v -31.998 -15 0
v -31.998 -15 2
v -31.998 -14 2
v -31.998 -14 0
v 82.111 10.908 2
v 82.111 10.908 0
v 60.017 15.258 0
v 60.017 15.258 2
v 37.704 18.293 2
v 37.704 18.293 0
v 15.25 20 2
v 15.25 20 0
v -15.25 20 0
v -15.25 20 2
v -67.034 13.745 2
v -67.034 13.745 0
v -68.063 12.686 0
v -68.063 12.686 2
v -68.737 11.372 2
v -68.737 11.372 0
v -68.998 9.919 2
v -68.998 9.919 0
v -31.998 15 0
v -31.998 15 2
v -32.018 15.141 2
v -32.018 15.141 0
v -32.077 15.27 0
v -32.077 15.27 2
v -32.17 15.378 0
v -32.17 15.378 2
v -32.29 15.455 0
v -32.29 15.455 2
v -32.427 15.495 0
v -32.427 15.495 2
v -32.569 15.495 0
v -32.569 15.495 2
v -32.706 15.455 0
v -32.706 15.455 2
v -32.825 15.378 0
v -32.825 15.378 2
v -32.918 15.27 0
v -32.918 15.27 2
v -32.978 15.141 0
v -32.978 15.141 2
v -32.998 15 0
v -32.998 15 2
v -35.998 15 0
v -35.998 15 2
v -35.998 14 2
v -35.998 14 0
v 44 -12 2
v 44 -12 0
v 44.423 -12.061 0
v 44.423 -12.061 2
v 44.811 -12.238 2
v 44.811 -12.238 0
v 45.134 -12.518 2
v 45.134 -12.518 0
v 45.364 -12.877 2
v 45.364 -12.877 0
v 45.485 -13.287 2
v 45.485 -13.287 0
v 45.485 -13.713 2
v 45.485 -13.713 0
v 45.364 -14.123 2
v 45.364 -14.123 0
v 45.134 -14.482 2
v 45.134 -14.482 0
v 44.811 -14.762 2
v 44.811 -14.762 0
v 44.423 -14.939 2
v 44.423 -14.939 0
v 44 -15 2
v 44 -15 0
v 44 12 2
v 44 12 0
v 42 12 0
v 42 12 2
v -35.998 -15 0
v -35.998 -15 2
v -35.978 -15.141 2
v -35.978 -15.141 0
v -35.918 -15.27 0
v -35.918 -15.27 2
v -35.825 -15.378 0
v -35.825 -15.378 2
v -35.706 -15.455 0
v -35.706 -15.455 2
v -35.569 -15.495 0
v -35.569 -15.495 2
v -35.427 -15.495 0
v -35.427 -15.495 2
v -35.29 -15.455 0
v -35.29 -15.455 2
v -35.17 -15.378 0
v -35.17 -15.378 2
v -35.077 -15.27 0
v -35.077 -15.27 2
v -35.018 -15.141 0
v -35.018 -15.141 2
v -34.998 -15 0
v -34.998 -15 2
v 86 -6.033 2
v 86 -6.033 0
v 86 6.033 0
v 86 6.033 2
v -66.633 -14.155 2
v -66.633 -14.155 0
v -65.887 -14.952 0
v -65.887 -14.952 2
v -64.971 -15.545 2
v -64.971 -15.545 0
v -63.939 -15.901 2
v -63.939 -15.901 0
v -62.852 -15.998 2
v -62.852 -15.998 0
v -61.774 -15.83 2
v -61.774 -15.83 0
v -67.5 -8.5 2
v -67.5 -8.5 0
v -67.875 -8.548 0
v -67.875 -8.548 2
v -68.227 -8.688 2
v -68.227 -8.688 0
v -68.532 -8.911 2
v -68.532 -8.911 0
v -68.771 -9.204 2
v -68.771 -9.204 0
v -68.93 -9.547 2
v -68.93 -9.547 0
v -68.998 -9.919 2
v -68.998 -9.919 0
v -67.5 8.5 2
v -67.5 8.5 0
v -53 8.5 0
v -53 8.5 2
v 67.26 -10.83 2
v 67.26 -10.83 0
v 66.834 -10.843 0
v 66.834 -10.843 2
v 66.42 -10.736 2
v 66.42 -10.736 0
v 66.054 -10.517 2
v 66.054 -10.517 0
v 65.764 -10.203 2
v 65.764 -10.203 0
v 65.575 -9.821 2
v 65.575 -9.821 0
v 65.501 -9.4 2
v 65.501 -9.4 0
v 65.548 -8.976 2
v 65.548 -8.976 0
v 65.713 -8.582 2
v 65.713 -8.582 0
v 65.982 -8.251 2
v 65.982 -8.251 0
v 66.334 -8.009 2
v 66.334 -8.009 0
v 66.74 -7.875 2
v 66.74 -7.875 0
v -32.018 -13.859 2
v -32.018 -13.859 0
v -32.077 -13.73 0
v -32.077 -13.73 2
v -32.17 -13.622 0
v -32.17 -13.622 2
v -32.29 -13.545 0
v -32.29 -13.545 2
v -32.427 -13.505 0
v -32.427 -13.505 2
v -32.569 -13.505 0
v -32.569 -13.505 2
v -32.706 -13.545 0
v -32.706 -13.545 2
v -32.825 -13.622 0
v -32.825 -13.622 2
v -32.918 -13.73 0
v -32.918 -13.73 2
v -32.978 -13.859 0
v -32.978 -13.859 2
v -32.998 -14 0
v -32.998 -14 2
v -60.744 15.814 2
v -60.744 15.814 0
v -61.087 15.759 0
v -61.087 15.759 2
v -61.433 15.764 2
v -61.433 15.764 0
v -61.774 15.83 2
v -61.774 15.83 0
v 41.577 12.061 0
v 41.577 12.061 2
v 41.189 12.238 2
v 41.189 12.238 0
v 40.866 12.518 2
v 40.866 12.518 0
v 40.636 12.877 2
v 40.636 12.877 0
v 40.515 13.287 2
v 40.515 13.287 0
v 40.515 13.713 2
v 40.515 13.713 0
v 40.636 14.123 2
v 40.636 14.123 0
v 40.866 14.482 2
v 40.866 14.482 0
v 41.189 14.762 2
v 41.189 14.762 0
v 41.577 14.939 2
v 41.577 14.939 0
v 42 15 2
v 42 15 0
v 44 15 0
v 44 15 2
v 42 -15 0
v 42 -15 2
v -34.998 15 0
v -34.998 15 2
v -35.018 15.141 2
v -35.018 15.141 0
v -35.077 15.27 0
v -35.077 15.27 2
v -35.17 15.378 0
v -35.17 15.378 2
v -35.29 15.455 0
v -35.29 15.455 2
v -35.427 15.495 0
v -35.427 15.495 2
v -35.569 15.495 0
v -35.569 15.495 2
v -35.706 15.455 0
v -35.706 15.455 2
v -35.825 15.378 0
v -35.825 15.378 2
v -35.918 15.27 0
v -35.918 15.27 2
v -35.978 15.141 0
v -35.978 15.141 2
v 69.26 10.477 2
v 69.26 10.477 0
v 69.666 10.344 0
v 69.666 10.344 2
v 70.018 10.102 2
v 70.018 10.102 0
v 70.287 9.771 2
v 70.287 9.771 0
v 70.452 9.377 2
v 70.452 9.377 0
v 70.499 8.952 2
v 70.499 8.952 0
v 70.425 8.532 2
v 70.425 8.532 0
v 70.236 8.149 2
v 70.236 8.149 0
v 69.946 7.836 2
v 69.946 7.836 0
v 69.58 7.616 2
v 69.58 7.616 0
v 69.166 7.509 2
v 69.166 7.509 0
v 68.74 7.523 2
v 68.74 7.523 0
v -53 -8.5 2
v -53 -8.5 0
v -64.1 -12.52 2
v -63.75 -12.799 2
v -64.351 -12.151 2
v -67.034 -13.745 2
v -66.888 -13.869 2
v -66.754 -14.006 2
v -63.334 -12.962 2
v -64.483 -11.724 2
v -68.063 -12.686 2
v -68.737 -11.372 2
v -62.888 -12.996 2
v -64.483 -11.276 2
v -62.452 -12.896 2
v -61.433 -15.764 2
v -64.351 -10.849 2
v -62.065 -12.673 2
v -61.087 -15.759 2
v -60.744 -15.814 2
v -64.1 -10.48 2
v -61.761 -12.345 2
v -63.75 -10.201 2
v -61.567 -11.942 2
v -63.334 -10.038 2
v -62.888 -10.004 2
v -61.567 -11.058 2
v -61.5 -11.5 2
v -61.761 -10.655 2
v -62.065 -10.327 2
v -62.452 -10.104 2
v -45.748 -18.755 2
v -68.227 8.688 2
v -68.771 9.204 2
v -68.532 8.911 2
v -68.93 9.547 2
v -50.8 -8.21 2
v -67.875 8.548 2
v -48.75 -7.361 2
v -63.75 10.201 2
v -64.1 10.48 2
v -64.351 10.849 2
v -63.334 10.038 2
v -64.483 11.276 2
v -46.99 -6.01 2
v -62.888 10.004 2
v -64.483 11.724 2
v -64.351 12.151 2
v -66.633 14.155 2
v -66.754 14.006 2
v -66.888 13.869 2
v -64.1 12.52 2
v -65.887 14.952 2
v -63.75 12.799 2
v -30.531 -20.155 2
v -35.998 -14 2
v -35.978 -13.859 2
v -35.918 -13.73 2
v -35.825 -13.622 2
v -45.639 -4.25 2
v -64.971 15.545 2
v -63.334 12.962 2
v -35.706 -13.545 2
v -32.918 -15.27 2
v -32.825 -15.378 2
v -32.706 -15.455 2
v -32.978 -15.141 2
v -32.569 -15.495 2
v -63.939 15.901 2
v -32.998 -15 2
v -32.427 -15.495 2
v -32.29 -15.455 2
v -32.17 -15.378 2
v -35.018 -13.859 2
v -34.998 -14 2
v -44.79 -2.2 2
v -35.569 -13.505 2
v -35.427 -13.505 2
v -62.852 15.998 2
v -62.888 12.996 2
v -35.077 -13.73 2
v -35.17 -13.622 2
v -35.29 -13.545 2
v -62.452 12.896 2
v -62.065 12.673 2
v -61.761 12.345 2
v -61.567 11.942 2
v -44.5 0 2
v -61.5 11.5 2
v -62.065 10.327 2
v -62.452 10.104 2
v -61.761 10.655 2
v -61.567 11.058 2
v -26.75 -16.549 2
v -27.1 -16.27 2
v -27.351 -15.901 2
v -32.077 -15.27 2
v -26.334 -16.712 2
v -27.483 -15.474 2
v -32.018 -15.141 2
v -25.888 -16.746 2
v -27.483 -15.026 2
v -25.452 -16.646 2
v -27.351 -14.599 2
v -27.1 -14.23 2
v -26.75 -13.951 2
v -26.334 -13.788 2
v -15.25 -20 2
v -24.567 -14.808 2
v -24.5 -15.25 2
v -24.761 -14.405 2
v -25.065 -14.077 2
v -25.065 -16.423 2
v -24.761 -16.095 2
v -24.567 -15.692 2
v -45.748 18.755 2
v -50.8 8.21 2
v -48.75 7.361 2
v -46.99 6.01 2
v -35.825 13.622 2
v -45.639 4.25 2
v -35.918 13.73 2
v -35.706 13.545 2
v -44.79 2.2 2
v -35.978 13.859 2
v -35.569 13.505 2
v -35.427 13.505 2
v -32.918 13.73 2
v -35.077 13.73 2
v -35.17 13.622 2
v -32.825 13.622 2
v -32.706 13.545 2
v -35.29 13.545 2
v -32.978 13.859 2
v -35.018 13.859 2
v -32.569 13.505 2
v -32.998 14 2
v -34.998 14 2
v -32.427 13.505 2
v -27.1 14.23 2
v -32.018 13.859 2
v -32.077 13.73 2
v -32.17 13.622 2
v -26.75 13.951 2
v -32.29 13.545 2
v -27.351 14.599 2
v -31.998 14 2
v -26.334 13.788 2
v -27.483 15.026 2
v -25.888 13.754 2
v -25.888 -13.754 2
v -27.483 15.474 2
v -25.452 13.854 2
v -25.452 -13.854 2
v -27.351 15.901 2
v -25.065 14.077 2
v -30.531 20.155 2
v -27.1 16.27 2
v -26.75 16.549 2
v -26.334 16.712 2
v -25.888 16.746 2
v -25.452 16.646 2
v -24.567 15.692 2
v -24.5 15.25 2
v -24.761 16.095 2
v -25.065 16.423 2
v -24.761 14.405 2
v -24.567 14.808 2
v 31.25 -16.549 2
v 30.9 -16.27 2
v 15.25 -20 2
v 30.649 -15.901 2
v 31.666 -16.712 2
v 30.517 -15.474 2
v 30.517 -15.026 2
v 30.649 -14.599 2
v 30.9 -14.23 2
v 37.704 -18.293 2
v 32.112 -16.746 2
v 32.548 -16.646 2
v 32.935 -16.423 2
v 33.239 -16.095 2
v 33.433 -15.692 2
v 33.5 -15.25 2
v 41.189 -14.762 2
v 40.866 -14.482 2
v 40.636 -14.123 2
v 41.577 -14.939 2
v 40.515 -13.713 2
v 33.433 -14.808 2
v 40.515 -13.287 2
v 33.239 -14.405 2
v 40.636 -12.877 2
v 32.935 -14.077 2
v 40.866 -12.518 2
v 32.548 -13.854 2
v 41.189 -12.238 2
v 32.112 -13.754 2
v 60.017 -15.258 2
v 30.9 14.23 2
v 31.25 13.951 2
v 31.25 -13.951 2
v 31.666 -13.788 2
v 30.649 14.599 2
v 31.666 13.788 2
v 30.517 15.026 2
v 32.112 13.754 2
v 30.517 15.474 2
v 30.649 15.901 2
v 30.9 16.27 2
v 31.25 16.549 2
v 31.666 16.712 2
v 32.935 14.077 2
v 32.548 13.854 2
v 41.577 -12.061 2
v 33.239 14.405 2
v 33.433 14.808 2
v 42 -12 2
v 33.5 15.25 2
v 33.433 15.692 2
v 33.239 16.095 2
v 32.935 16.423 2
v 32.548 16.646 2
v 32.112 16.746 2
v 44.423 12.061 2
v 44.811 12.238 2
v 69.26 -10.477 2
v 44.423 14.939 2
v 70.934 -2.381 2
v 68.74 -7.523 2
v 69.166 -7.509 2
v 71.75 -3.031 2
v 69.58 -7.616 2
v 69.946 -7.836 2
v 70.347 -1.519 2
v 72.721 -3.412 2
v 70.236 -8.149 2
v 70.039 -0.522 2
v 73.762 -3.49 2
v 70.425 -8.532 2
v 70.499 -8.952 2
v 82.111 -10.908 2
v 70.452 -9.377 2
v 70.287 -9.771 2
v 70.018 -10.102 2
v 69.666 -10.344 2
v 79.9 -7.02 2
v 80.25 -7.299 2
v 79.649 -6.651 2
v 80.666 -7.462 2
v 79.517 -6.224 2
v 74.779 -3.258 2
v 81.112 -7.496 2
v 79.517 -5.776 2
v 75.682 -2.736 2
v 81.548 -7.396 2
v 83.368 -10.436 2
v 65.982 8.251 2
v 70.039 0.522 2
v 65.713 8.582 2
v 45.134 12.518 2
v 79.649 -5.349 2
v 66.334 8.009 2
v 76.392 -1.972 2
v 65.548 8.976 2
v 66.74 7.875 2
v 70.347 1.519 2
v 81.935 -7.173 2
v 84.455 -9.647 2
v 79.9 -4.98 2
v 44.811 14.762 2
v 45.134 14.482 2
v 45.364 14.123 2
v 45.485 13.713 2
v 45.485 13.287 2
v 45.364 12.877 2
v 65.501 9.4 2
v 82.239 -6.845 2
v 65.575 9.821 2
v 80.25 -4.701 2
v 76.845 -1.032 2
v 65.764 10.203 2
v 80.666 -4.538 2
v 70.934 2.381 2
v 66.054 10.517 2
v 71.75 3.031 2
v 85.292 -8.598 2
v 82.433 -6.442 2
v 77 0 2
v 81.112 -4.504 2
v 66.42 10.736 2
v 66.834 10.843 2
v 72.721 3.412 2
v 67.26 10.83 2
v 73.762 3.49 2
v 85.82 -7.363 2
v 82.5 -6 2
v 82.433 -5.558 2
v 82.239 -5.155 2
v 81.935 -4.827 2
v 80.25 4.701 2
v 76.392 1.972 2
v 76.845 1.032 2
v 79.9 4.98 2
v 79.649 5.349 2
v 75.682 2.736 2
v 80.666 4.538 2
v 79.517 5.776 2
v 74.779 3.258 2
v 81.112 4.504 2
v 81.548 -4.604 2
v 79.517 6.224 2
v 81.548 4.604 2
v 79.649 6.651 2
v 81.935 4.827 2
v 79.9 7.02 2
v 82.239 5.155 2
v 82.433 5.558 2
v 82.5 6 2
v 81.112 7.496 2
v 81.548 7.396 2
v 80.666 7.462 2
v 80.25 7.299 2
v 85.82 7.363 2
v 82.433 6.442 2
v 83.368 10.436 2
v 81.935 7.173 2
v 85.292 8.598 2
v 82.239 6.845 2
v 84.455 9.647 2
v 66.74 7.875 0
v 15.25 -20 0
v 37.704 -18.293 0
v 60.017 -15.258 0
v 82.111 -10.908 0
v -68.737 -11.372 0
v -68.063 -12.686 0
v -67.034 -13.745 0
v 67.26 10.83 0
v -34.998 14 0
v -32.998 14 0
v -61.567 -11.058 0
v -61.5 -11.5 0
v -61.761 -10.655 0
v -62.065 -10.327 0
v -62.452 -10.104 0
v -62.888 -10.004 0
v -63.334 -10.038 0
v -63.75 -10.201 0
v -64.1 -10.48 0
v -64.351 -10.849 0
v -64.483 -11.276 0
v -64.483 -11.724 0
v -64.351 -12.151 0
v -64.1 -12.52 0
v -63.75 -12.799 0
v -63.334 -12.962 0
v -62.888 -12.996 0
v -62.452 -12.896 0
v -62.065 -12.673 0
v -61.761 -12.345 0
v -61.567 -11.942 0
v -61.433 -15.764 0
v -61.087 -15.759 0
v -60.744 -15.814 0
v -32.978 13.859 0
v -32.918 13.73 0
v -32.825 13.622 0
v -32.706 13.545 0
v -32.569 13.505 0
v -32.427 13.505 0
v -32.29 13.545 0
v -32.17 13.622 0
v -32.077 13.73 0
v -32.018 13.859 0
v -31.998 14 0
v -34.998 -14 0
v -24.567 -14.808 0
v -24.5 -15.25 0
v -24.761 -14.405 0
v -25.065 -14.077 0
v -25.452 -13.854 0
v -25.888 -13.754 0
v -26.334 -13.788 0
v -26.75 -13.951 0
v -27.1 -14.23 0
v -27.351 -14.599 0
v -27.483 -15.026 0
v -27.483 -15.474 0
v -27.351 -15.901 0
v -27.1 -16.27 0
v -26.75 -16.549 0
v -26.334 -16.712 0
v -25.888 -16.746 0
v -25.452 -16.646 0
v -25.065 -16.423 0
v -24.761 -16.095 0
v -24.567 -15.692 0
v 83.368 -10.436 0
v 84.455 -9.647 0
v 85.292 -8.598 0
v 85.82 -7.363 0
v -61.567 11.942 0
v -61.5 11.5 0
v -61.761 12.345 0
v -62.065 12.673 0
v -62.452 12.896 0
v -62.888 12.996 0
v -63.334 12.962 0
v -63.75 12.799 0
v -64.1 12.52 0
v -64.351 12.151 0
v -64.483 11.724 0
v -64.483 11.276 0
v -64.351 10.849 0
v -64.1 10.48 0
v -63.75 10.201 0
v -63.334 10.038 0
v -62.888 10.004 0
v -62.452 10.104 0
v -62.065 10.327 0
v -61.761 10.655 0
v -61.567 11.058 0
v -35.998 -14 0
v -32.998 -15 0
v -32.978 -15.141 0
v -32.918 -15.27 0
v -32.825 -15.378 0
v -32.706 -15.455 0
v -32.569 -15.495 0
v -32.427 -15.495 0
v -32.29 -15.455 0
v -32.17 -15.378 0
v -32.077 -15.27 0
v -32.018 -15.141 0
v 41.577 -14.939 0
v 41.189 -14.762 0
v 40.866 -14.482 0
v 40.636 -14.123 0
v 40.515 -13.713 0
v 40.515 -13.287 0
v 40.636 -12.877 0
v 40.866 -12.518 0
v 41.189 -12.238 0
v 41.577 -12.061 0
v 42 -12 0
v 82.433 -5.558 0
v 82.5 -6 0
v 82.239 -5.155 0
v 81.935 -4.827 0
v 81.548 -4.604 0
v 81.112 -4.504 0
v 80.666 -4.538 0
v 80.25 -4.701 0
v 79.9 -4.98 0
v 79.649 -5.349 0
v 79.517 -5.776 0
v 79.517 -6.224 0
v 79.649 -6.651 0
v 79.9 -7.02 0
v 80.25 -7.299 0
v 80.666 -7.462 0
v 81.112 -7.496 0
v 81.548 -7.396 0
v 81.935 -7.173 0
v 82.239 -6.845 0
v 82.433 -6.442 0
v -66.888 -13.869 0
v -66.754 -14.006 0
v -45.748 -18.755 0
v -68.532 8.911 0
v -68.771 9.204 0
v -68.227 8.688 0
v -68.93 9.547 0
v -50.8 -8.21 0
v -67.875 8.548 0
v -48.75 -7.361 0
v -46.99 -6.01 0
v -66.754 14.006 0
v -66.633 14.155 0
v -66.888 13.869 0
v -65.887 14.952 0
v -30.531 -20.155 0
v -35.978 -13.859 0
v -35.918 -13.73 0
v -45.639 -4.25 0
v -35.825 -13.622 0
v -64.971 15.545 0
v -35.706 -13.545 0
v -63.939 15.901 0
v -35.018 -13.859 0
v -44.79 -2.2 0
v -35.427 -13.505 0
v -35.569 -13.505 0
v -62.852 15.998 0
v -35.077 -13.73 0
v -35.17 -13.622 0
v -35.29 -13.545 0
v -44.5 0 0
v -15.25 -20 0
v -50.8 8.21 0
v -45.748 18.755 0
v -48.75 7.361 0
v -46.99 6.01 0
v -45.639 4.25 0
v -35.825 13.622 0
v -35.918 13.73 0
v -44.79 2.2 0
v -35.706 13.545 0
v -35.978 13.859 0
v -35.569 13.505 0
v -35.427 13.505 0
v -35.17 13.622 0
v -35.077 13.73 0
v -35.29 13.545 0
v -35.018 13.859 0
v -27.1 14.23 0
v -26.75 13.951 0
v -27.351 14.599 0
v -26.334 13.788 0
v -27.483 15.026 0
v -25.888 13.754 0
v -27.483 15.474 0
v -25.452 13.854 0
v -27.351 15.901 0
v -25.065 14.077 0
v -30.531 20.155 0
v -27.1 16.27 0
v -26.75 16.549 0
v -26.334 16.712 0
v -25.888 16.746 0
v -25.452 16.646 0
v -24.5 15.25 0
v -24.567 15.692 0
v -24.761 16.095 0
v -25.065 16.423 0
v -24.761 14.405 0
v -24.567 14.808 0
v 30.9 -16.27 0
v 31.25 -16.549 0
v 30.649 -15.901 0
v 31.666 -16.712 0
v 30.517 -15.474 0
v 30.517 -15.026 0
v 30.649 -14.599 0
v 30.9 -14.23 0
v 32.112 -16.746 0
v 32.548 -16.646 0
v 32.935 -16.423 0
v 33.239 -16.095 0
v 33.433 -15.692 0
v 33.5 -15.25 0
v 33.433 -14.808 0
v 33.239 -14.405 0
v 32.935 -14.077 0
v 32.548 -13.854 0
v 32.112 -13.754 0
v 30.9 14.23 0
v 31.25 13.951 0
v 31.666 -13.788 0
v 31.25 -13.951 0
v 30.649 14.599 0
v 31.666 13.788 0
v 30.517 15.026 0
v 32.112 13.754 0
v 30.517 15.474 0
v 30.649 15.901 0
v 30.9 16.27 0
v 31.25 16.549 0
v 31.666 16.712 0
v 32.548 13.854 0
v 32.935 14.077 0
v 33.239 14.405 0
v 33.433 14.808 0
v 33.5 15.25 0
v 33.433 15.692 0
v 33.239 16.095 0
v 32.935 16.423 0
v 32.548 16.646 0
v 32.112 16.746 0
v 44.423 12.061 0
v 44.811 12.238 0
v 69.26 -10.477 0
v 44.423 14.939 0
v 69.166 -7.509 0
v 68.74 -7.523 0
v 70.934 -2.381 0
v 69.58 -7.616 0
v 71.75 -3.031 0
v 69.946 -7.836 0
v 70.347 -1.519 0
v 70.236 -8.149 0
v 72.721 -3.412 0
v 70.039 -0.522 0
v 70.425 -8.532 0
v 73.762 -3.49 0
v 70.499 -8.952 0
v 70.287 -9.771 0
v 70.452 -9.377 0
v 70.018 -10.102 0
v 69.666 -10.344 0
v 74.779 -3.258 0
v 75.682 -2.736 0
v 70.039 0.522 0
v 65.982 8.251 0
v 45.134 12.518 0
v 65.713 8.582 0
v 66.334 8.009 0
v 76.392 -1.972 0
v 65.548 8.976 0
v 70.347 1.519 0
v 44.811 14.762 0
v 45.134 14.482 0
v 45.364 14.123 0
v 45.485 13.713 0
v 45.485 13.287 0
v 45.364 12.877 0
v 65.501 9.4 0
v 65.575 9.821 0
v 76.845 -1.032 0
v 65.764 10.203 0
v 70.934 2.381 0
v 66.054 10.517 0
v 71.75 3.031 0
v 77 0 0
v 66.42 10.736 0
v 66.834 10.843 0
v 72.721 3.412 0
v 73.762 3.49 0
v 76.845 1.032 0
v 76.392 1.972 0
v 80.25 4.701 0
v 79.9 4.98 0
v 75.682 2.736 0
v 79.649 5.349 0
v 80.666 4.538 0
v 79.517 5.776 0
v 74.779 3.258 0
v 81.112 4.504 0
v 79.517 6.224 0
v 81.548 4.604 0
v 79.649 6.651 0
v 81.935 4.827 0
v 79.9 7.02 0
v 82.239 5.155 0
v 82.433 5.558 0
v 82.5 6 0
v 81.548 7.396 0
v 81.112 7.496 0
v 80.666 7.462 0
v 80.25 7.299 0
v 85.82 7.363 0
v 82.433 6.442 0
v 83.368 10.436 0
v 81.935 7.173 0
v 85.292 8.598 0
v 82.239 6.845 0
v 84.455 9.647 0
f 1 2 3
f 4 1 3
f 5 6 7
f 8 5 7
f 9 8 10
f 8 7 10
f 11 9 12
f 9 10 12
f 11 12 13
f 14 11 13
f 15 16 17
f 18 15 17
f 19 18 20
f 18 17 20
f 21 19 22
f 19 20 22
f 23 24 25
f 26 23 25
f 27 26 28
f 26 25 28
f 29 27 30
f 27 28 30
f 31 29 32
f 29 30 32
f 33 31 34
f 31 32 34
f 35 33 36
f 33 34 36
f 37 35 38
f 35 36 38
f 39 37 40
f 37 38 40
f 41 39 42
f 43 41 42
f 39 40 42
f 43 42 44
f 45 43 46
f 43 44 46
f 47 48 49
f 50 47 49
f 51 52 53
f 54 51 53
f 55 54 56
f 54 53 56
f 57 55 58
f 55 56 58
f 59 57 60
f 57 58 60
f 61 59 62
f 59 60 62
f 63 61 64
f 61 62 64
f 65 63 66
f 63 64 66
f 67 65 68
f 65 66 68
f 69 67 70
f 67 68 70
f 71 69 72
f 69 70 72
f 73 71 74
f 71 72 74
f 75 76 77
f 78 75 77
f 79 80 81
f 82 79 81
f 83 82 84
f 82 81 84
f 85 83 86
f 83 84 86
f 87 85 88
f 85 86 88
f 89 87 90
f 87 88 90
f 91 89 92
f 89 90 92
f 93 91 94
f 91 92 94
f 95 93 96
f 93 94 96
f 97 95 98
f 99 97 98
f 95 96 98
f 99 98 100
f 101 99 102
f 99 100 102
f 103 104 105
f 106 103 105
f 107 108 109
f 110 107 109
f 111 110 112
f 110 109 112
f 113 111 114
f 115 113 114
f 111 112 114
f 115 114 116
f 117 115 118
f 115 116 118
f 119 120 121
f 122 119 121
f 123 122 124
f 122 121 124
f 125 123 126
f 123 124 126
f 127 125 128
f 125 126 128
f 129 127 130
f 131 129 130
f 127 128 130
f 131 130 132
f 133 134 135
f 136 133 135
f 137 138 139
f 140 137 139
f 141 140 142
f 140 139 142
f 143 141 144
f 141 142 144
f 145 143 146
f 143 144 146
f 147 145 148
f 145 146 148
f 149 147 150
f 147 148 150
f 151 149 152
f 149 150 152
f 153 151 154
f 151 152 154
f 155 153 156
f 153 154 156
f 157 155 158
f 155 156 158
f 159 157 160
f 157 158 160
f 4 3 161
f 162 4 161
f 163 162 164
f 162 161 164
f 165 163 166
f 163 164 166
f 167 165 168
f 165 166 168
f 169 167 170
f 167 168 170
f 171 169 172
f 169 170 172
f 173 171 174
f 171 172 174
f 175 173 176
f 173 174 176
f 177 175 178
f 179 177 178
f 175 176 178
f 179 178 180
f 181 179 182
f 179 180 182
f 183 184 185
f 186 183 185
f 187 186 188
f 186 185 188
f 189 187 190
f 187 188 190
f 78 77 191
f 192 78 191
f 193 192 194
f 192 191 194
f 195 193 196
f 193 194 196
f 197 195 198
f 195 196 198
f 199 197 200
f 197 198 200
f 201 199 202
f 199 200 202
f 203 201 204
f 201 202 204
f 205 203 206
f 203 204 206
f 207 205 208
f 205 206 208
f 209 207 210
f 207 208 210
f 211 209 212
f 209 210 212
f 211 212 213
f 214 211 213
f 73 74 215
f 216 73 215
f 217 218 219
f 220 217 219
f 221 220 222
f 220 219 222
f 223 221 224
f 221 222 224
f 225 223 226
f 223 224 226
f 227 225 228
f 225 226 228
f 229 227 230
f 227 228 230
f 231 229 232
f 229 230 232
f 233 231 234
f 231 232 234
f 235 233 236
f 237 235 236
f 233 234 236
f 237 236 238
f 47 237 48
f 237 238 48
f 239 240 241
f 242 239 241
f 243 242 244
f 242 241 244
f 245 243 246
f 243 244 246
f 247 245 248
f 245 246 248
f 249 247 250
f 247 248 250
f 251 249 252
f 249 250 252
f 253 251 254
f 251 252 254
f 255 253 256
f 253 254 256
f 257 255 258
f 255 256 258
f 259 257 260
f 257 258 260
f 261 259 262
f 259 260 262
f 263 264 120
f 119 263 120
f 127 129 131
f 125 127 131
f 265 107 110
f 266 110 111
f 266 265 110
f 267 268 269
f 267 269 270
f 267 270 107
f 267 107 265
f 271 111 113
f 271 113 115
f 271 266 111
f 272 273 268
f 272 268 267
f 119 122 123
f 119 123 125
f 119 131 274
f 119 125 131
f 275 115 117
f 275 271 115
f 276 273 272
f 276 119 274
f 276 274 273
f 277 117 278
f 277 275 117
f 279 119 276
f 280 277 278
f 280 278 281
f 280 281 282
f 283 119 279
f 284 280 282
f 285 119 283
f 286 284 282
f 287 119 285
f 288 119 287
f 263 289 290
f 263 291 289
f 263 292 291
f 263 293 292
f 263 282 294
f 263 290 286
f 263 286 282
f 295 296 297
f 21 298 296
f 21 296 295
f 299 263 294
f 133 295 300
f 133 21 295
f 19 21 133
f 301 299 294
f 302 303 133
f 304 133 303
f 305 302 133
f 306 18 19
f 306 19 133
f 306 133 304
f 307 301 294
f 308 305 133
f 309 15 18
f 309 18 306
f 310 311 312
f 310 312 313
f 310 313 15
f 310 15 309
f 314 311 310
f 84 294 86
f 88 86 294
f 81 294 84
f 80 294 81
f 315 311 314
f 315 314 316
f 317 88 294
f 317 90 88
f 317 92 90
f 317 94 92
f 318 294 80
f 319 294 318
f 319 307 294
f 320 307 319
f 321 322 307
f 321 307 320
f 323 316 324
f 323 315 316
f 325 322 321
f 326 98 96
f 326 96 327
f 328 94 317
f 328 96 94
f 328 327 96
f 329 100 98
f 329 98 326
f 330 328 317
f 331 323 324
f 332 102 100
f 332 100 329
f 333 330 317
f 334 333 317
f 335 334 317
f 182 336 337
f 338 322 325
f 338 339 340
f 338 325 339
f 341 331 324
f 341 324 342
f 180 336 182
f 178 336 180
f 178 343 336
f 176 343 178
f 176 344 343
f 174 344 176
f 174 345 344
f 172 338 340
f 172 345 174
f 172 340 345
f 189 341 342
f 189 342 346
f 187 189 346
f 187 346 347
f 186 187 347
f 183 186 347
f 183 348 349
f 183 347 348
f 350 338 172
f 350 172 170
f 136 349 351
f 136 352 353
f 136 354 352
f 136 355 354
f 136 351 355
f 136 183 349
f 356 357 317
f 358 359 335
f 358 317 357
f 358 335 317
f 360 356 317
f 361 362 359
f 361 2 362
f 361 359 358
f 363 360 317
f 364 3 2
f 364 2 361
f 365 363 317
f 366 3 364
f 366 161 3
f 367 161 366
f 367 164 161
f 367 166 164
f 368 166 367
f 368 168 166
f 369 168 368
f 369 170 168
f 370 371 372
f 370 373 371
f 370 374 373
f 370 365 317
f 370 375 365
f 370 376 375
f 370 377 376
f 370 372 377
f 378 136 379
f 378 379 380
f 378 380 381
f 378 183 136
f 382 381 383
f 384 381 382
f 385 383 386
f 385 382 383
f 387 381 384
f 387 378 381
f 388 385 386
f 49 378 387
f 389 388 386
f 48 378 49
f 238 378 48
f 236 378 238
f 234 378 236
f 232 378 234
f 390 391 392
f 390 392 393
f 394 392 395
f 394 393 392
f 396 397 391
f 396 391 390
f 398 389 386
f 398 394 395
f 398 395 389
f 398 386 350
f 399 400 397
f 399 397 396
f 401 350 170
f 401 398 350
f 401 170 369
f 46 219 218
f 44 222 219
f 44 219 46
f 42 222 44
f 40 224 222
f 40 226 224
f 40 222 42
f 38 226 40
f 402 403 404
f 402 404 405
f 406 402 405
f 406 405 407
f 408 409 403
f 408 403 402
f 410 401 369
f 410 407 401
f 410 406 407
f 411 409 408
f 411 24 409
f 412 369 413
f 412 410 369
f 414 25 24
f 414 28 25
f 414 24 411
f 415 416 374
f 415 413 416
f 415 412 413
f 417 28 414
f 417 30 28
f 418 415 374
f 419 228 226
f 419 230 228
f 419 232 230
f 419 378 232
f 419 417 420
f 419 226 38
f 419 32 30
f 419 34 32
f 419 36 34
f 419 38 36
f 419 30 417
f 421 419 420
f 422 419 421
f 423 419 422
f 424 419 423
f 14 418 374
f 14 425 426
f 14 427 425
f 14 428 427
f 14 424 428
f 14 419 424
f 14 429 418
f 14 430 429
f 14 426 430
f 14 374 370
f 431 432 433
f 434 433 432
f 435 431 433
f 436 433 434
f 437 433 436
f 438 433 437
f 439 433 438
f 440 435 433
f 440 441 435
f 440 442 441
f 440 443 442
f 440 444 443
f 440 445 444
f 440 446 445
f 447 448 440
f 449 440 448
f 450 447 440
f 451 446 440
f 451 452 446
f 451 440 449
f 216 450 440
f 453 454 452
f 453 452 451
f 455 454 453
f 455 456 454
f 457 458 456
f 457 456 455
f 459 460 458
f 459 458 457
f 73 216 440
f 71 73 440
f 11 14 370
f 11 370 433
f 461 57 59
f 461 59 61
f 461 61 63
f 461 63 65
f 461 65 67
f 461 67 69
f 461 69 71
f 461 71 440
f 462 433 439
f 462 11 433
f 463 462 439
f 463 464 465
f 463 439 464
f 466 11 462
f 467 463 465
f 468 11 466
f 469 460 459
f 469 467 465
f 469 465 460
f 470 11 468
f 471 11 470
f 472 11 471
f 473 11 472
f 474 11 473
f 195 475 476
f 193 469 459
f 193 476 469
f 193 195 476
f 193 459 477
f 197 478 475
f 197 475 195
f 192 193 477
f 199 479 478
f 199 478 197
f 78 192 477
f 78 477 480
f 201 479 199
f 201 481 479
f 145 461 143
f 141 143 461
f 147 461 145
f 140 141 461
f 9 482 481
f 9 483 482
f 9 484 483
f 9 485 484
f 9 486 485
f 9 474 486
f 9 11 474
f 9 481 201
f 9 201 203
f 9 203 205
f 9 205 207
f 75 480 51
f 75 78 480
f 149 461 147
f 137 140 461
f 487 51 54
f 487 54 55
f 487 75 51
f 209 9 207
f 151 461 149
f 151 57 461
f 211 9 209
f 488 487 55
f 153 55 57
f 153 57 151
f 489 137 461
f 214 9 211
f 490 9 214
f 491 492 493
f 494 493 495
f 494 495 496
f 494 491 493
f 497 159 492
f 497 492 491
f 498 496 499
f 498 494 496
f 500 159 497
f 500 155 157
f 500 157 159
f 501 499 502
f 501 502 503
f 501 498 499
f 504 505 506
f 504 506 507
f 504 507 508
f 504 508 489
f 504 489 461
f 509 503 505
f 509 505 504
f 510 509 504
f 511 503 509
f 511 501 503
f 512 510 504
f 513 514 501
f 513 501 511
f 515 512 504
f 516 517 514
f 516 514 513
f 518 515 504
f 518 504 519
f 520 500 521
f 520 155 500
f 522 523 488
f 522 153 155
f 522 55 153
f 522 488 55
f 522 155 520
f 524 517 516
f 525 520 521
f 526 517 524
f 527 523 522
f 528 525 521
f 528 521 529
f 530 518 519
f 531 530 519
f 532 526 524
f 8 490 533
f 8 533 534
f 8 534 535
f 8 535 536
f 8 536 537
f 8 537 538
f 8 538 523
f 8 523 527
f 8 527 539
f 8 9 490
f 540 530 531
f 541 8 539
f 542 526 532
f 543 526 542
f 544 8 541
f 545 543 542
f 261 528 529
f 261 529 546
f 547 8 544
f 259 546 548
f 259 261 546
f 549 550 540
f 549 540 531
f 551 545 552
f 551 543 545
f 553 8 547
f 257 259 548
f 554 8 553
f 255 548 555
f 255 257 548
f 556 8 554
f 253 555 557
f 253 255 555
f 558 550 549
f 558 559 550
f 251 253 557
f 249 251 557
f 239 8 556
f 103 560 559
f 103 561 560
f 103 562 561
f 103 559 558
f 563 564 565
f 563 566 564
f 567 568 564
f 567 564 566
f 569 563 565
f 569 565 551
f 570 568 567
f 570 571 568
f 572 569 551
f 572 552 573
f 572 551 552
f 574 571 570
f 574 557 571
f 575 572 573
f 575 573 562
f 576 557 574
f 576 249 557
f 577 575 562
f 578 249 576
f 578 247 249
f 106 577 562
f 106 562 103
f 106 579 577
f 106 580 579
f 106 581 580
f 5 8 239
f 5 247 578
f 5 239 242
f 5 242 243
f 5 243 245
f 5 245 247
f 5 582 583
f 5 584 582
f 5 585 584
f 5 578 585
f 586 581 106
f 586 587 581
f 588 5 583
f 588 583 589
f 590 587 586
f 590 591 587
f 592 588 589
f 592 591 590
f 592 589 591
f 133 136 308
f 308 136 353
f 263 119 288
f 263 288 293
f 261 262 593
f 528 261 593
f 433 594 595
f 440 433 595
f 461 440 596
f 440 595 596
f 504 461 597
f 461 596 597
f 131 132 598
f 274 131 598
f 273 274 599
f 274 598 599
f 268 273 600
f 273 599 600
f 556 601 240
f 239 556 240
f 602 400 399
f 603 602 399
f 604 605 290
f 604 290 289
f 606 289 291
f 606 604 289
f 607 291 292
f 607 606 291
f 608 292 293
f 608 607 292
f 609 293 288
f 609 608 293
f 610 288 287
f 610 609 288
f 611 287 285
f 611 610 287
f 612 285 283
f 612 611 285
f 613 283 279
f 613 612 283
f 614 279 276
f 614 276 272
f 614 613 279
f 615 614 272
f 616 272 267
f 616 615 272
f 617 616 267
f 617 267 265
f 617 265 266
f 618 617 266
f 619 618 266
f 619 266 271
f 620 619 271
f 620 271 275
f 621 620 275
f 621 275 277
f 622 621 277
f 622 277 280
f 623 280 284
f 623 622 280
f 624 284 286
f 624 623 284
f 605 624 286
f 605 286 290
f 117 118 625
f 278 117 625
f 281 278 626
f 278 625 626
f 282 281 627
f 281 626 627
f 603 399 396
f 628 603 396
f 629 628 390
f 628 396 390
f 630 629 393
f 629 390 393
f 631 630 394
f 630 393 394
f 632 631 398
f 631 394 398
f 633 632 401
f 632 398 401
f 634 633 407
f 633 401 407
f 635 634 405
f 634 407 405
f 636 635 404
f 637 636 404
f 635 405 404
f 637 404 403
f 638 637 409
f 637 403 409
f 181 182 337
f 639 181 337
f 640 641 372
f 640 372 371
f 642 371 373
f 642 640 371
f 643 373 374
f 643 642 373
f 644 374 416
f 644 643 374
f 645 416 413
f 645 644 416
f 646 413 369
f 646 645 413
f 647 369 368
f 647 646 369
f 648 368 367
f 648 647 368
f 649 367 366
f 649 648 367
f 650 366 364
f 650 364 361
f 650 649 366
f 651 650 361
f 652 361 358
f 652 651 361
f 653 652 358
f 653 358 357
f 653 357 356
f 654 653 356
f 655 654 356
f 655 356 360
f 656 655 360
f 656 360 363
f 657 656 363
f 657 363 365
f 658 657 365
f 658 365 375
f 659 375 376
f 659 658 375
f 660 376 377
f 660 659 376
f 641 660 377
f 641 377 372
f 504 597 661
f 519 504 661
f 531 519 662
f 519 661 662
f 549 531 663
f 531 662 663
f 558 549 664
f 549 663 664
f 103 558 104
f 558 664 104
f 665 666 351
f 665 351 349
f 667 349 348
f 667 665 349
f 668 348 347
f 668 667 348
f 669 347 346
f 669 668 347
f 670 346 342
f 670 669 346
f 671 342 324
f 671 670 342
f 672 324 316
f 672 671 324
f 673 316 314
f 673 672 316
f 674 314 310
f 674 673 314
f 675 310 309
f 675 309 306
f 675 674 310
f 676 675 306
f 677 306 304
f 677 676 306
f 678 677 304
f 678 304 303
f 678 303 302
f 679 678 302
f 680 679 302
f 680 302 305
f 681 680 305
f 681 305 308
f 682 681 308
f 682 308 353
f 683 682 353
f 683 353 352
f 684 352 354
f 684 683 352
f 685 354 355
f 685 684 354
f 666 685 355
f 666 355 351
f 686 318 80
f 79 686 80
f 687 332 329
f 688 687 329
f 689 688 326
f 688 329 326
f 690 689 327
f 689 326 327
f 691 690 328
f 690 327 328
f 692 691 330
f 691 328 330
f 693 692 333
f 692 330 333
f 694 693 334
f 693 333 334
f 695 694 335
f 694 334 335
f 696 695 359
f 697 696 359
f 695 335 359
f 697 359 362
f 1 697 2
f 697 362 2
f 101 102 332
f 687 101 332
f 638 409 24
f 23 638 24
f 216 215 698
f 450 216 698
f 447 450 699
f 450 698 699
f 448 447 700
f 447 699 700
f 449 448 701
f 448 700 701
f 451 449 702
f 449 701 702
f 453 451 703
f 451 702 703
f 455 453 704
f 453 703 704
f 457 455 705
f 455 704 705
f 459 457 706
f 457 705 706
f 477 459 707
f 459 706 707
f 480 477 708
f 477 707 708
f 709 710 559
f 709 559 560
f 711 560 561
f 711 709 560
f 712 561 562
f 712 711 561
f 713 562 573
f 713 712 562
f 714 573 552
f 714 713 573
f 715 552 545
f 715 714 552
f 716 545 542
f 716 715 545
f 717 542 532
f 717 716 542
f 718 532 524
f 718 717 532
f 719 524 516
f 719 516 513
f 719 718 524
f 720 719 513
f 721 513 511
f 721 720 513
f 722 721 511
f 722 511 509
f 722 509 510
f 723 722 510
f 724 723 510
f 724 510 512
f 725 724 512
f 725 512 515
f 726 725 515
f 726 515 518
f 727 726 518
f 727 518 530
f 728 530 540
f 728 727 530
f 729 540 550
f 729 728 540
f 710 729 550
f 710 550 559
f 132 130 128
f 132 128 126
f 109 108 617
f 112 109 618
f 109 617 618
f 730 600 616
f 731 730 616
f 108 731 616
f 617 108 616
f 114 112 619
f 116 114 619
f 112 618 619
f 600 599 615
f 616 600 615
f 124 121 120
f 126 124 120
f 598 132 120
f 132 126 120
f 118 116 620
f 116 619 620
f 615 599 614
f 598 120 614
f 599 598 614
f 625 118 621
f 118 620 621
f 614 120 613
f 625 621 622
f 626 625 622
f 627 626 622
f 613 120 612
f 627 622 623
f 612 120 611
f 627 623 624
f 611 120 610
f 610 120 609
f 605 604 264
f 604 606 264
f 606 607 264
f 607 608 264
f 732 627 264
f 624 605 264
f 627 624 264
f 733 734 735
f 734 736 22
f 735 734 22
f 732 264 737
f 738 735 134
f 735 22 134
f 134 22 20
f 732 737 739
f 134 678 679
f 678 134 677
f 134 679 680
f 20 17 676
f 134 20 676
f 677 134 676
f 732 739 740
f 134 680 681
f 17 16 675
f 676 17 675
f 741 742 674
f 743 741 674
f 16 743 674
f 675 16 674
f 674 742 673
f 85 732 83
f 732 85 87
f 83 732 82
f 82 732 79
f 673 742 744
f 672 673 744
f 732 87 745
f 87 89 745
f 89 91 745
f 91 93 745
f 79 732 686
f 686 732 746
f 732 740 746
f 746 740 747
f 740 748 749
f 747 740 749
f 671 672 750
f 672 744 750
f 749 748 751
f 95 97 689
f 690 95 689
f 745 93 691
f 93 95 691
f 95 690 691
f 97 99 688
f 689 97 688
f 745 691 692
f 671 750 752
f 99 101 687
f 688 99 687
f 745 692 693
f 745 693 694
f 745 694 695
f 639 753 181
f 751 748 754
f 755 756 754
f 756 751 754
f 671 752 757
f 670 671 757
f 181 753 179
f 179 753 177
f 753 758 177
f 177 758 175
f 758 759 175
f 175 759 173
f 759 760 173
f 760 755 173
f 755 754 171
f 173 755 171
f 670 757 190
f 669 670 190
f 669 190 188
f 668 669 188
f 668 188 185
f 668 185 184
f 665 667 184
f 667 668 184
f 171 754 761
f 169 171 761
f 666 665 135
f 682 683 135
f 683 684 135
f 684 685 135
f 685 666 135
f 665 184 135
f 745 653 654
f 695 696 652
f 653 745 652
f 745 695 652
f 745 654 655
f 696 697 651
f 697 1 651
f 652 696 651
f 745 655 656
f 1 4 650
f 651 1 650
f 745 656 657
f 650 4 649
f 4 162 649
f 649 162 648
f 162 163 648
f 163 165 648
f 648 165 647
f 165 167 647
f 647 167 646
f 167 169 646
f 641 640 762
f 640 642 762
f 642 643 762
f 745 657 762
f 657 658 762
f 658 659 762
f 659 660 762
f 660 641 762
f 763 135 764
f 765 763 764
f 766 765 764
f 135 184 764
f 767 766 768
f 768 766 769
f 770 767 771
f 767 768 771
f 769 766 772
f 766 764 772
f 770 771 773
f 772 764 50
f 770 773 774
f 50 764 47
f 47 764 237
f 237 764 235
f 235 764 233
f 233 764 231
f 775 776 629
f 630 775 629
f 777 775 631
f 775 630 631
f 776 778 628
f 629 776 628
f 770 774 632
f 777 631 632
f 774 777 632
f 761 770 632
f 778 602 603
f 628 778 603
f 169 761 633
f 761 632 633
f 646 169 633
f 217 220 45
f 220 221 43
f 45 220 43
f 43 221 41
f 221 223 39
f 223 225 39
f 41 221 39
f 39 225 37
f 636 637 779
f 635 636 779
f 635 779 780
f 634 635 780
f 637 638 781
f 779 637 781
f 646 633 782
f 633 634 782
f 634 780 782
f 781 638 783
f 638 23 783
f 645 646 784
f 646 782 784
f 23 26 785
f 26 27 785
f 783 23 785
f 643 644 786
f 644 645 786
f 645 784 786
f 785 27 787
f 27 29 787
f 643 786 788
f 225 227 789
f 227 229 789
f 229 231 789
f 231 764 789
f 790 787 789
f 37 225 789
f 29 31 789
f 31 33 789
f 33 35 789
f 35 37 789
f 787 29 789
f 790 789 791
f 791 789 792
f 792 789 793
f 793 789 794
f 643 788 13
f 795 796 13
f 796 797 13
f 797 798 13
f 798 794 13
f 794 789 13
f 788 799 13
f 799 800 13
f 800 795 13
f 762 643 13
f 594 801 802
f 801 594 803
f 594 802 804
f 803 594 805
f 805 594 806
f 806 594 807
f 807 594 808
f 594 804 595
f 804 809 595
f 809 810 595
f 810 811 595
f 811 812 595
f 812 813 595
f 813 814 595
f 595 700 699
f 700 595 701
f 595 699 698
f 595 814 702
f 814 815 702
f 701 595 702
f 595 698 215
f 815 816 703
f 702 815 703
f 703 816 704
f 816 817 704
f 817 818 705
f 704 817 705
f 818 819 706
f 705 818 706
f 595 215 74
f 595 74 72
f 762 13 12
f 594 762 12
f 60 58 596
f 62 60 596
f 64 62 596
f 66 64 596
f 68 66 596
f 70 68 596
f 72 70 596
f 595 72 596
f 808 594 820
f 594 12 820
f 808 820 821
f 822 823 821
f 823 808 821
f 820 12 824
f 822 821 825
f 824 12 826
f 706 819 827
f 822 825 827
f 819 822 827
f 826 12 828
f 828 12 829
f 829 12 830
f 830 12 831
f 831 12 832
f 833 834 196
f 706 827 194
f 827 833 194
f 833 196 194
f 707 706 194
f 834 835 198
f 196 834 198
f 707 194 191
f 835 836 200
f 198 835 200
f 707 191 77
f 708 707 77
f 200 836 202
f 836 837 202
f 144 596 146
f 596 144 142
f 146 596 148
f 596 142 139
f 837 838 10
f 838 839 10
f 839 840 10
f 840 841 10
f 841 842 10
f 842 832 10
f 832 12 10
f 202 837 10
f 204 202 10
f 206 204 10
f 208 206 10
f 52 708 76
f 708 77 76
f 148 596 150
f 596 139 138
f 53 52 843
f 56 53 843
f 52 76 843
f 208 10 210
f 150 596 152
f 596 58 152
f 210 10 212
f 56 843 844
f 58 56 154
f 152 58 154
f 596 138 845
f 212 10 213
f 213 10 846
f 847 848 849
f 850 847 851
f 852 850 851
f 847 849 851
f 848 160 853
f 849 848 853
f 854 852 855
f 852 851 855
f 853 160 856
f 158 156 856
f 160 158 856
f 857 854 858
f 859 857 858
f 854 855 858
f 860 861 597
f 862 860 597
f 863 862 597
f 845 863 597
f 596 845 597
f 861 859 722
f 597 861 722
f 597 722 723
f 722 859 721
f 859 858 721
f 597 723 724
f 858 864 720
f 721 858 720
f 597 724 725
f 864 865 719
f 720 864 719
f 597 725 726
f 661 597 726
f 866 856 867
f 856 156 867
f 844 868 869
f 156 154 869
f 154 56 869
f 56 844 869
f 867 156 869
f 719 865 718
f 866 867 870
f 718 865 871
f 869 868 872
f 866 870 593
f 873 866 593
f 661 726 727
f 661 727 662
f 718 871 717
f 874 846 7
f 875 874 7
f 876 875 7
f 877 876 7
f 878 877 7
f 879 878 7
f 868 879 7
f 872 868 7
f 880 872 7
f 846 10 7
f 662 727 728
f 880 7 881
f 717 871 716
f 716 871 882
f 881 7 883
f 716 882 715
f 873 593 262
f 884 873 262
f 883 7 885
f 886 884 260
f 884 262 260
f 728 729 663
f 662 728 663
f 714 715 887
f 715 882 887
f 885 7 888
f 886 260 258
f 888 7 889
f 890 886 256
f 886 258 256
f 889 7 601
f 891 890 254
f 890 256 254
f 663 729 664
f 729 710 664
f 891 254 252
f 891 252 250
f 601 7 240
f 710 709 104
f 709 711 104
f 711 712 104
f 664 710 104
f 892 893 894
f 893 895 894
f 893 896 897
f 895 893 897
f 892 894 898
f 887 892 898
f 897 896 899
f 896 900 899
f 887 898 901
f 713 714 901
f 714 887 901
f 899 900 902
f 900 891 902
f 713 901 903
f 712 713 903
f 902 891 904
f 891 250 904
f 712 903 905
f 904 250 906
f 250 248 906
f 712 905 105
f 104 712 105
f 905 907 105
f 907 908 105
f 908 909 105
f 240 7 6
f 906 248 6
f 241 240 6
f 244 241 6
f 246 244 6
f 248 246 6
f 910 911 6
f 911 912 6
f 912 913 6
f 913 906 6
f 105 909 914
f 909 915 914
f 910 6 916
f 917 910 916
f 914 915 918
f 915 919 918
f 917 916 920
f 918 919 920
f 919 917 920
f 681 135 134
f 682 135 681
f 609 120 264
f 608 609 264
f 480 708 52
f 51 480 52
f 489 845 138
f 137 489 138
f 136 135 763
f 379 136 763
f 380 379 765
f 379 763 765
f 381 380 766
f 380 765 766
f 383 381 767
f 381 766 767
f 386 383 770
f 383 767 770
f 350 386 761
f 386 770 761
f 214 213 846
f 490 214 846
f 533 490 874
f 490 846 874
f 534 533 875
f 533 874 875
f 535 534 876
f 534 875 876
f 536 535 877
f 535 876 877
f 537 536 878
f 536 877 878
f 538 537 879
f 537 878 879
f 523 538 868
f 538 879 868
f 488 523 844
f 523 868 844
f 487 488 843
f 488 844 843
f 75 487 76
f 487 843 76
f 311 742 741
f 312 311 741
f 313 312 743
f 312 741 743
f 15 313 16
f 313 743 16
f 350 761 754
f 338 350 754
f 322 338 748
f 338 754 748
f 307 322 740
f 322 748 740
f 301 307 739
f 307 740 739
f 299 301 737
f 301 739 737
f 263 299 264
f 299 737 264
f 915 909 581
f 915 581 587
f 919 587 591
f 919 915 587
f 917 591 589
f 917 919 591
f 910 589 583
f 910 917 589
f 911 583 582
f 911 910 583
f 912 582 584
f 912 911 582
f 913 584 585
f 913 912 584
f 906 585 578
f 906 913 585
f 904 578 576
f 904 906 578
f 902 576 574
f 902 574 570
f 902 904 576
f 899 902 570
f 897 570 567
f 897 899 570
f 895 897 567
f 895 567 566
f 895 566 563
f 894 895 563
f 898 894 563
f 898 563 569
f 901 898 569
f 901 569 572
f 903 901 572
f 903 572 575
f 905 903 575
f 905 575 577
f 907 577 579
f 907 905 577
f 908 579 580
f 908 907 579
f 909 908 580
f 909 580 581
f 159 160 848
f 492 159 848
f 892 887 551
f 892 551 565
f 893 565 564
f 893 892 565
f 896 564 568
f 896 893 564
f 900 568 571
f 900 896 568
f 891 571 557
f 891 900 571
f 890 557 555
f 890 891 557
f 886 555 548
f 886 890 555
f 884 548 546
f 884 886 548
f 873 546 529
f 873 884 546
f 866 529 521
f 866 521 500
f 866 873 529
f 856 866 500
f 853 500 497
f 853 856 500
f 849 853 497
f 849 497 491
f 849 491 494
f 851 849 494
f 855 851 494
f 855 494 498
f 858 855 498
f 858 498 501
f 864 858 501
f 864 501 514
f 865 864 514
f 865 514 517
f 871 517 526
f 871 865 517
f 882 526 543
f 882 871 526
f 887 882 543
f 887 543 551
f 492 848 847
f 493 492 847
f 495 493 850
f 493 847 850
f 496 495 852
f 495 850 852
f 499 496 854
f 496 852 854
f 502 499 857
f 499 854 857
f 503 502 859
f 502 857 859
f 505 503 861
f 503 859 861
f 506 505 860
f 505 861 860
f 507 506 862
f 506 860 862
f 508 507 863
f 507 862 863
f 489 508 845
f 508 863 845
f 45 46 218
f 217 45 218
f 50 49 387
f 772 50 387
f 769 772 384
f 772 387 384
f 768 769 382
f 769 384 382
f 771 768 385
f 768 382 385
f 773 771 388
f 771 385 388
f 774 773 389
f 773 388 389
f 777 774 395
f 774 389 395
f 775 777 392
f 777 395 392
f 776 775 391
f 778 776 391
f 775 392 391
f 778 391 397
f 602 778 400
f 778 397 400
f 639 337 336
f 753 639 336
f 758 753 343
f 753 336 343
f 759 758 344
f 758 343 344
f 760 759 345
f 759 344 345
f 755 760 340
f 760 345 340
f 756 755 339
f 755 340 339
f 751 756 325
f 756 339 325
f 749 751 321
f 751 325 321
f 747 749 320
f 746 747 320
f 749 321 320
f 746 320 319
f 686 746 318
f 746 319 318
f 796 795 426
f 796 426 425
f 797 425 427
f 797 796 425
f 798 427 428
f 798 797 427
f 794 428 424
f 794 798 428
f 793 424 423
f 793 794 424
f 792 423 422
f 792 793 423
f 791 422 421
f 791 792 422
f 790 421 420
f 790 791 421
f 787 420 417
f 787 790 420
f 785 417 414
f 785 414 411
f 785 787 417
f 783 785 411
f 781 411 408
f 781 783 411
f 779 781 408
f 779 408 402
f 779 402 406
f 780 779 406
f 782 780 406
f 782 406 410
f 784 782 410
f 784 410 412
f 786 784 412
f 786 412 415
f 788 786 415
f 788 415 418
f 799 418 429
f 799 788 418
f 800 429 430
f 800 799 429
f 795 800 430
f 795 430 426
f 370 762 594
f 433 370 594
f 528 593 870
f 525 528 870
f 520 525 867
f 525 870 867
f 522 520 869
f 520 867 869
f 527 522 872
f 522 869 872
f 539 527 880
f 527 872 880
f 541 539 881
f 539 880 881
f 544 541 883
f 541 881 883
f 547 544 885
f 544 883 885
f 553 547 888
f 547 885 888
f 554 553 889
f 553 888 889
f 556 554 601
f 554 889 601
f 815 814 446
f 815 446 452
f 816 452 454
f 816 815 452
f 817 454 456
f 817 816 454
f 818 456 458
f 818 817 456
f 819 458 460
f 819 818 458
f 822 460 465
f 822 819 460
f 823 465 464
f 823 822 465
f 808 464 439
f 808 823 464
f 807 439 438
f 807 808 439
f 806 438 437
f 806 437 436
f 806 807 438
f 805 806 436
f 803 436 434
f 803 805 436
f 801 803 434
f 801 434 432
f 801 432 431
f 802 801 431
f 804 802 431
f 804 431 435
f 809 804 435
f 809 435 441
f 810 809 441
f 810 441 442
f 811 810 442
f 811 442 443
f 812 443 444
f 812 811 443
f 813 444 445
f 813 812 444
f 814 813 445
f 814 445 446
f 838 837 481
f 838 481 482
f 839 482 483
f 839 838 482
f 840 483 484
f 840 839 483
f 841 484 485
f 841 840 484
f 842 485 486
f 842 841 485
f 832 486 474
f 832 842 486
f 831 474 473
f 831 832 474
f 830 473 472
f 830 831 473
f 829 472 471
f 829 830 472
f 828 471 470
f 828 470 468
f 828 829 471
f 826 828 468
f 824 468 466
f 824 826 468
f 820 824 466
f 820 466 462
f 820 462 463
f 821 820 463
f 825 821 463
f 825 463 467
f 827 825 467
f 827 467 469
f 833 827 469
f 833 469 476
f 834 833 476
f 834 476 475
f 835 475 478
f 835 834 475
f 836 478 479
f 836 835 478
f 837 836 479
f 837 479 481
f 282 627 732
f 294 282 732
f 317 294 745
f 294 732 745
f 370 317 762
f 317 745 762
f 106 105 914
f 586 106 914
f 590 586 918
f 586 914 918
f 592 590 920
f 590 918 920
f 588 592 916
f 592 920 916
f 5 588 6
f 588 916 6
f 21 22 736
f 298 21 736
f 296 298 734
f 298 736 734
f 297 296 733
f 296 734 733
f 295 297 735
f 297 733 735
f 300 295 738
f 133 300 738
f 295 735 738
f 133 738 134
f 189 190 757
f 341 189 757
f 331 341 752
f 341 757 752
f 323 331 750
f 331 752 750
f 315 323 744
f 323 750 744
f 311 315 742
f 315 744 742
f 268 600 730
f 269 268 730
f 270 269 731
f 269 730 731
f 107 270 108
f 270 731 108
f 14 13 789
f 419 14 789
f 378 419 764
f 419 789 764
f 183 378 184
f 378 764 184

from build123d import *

# Parameters (mm, degrees)
F0_R     = 1.5
F0_R_2   = 3.5
F1_DEPTH = 2
F3_DEPTH = 25


with BuildPart() as f1:
    # F0 (on Top) → F1 (new body)
    with BuildSketch(Plane.XY):
        with BuildLine():
            ThreePointArc((-67.034419, 13.74533), (-68.448505, 12.054094), (-68.997817, 9.919106))
            ThreePointArc((-68.997817, 9.919106), (-68.531663, 8.911115), (-67.5, 8.5))
            Line((-67.5, 8.5), (-53, 8.5))
            ThreePointArc((-53, 8.5), (-46.989592, 6.010408), (-44.5, 0))
            ThreePointArc((-44.5, 0), (-46.989592, -6.010408), (-53, -8.5))
            Line((-53, -8.5), (-67.5, -8.5))
            ThreePointArc((-67.5, -8.5), (-68.531663, -8.911115), (-68.997817, -9.919106))
            ThreePointArc((-68.997817, -9.919106), (-68.448505, -12.054094), (-67.034419, -13.74533))
            ThreePointArc((-67.034419, -13.74533), (-66.819137, -13.93569), (-66.63336, -14.154938))
            ThreePointArc((-66.63336, -14.154938), (-64.466194, -15.754442), (-61.773732, -15.829696))
            ThreePointArc((-61.773732, -15.829696), (-61.260071, -15.754251), (-60.744298, -15.813559))
            ThreePointArc((-60.744298, -15.813559), (-38.15747, -19.649003), (-15.25, -20))
            Line((-15.25, -20), (15.25, -20))
            ThreePointArc((15.25, -20), (48.882685, -16.940884), (82.110948, -10.907783))
            ThreePointArc((82.110948, -10.907783), (84.908628, -9.150879), (86, -6.032766))
            Line((86, -6.032766), (86, 0))
            Line((86, 0), (86, 6.032766))
            ThreePointArc((86, 6.032766), (84.908628, 9.150879), (82.110948, 10.907783))
            ThreePointArc((82.110948, 10.907783), (48.882685, 16.940884), (15.25, 20))
            Line((15.25, 20), (-15.25, 20))
            ThreePointArc((-15.25, 20), (-38.15747, 19.649003), (-60.744298, 15.813559))
            ThreePointArc((-60.744298, 15.813559), (-61.260071, 15.754251), (-61.773732, 15.829696))
            ThreePointArc((-61.773732, 15.829696), (-64.466194, 15.754442), (-66.63336, 14.154938))
            ThreePointArc((-66.63336, 14.154938), (-66.819137, 13.93569), (-67.034419, 13.74533))
        make_face()
        with Locations((-63, -11.5)):
            Circle(F0_R, mode=Mode.SUBTRACT)
        with Locations((-26, -15.25)):
            Circle(F0_R, mode=Mode.SUBTRACT)
        with Locations((32, -15.25)):
            Circle(F0_R, mode=Mode.SUBTRACT)
        with BuildLine():
            Line((42, -12), (44, -12))
            ThreePointArc((44, -12), (45.5, -13.5), (44, -15))
            Line((44, -15), (42, -15))
            ThreePointArc((42, -15), (40.5, -13.5), (42, -12))
        make_face(mode=Mode.SUBTRACT)
        with BuildLine():
            Line((66.739528, -7.875442), (68.739528, -7.522788))
            ThreePointArc((68.739528, -7.522788), (70.477212, -8.739528), (69.260472, -10.477212))
            Line((69.260472, -10.477212), (67.260472, -10.829866))
            ThreePointArc((67.260472, -10.829866), (65.522788, -9.613126), (66.739528, -7.875442))
        make_face(mode=Mode.SUBTRACT)
        with Locations((81, -6)):
            Circle(F0_R, mode=Mode.SUBTRACT)
        with Locations((-63, 11.5)):
            Circle(F0_R, mode=Mode.SUBTRACT)
        with Locations((-26, 15.25)):
            Circle(F0_R, mode=Mode.SUBTRACT)
        with Locations((73.5, 0)):
            Circle(F0_R_2, mode=Mode.SUBTRACT)
        with Locations((81, 6)):
            Circle(F0_R, mode=Mode.SUBTRACT)
        with BuildLine():
            ThreePointArc((66.739528, 7.875442), (65.522788, 9.613126), (67.260472, 10.829866))
            Line((67.260472, 10.829866), (69.260472, 10.477212))
            ThreePointArc((69.260472, 10.477212), (70.477212, 8.739528), (68.739528, 7.522788))
            Line((68.739528, 7.522788), (66.739528, 7.875442))
        make_face(mode=Mode.SUBTRACT)
        with BuildLine():
            ThreePointArc((42, 12), (40.5, 13.5), (42, 15))
            Line((42, 15), (44, 15))
            ThreePointArc((44, 15), (45.5, 13.5), (44, 12))
            Line((44, 12), (42, 12))
        make_face(mode=Mode.SUBTRACT)
        with Locations((32, 15.25)):
            Circle(F0_R, mode=Mode.SUBTRACT)
    extrude(amount=F1_DEPTH)

    # F2 (on face) → F3 (cut)
    with BuildSketch(Plane.XY.offset(2)):
        with BuildLine():
            Line((-32.997817, 15), (-34.997817, 15))
            ThreePointArc((-34.997817, 15), (-35.497817, 15.5), (-35.997817, 15))
            Line((-35.997817, 15), (-35.997817, 14))
            ThreePointArc((-35.997817, 14), (-35.497817, 13.5), (-34.997817, 14))
            Line((-34.997817, 14), (-32.997817, 14))
            ThreePointArc((-32.997817, 14), (-32.497817, 13.5), (-31.997817, 14))
            Line((-31.997817, 14), (-31.997817, 15))
            ThreePointArc((-31.997817, 15), (-32.497817, 15.5), (-32.997817, 15))
        make_face()
        with BuildLine():
            Line((-35.997817, -14), (-35.997817, -15))
            ThreePointArc((-35.997817, -15), (-35.497817, -15.5), (-34.997817, -15))
            Line((-34.997817, -15), (-32.997817, -15))
            ThreePointArc((-32.997817, -15), (-32.497817, -15.5), (-31.997817, -15))
            Line((-31.997817, -15), (-31.997817, -14))
            ThreePointArc((-31.997817, -14), (-32.497817, -13.5), (-32.997817, -14))
            Line((-32.997817, -14), (-34.997817, -14))
            ThreePointArc((-34.997817, -14), (-35.497817, -13.5), (-35.997817, -14))
        make_face()
    extrude(amount=-F3_DEPTH, mode=Mode.SUBTRACT)


solid = f1.part
